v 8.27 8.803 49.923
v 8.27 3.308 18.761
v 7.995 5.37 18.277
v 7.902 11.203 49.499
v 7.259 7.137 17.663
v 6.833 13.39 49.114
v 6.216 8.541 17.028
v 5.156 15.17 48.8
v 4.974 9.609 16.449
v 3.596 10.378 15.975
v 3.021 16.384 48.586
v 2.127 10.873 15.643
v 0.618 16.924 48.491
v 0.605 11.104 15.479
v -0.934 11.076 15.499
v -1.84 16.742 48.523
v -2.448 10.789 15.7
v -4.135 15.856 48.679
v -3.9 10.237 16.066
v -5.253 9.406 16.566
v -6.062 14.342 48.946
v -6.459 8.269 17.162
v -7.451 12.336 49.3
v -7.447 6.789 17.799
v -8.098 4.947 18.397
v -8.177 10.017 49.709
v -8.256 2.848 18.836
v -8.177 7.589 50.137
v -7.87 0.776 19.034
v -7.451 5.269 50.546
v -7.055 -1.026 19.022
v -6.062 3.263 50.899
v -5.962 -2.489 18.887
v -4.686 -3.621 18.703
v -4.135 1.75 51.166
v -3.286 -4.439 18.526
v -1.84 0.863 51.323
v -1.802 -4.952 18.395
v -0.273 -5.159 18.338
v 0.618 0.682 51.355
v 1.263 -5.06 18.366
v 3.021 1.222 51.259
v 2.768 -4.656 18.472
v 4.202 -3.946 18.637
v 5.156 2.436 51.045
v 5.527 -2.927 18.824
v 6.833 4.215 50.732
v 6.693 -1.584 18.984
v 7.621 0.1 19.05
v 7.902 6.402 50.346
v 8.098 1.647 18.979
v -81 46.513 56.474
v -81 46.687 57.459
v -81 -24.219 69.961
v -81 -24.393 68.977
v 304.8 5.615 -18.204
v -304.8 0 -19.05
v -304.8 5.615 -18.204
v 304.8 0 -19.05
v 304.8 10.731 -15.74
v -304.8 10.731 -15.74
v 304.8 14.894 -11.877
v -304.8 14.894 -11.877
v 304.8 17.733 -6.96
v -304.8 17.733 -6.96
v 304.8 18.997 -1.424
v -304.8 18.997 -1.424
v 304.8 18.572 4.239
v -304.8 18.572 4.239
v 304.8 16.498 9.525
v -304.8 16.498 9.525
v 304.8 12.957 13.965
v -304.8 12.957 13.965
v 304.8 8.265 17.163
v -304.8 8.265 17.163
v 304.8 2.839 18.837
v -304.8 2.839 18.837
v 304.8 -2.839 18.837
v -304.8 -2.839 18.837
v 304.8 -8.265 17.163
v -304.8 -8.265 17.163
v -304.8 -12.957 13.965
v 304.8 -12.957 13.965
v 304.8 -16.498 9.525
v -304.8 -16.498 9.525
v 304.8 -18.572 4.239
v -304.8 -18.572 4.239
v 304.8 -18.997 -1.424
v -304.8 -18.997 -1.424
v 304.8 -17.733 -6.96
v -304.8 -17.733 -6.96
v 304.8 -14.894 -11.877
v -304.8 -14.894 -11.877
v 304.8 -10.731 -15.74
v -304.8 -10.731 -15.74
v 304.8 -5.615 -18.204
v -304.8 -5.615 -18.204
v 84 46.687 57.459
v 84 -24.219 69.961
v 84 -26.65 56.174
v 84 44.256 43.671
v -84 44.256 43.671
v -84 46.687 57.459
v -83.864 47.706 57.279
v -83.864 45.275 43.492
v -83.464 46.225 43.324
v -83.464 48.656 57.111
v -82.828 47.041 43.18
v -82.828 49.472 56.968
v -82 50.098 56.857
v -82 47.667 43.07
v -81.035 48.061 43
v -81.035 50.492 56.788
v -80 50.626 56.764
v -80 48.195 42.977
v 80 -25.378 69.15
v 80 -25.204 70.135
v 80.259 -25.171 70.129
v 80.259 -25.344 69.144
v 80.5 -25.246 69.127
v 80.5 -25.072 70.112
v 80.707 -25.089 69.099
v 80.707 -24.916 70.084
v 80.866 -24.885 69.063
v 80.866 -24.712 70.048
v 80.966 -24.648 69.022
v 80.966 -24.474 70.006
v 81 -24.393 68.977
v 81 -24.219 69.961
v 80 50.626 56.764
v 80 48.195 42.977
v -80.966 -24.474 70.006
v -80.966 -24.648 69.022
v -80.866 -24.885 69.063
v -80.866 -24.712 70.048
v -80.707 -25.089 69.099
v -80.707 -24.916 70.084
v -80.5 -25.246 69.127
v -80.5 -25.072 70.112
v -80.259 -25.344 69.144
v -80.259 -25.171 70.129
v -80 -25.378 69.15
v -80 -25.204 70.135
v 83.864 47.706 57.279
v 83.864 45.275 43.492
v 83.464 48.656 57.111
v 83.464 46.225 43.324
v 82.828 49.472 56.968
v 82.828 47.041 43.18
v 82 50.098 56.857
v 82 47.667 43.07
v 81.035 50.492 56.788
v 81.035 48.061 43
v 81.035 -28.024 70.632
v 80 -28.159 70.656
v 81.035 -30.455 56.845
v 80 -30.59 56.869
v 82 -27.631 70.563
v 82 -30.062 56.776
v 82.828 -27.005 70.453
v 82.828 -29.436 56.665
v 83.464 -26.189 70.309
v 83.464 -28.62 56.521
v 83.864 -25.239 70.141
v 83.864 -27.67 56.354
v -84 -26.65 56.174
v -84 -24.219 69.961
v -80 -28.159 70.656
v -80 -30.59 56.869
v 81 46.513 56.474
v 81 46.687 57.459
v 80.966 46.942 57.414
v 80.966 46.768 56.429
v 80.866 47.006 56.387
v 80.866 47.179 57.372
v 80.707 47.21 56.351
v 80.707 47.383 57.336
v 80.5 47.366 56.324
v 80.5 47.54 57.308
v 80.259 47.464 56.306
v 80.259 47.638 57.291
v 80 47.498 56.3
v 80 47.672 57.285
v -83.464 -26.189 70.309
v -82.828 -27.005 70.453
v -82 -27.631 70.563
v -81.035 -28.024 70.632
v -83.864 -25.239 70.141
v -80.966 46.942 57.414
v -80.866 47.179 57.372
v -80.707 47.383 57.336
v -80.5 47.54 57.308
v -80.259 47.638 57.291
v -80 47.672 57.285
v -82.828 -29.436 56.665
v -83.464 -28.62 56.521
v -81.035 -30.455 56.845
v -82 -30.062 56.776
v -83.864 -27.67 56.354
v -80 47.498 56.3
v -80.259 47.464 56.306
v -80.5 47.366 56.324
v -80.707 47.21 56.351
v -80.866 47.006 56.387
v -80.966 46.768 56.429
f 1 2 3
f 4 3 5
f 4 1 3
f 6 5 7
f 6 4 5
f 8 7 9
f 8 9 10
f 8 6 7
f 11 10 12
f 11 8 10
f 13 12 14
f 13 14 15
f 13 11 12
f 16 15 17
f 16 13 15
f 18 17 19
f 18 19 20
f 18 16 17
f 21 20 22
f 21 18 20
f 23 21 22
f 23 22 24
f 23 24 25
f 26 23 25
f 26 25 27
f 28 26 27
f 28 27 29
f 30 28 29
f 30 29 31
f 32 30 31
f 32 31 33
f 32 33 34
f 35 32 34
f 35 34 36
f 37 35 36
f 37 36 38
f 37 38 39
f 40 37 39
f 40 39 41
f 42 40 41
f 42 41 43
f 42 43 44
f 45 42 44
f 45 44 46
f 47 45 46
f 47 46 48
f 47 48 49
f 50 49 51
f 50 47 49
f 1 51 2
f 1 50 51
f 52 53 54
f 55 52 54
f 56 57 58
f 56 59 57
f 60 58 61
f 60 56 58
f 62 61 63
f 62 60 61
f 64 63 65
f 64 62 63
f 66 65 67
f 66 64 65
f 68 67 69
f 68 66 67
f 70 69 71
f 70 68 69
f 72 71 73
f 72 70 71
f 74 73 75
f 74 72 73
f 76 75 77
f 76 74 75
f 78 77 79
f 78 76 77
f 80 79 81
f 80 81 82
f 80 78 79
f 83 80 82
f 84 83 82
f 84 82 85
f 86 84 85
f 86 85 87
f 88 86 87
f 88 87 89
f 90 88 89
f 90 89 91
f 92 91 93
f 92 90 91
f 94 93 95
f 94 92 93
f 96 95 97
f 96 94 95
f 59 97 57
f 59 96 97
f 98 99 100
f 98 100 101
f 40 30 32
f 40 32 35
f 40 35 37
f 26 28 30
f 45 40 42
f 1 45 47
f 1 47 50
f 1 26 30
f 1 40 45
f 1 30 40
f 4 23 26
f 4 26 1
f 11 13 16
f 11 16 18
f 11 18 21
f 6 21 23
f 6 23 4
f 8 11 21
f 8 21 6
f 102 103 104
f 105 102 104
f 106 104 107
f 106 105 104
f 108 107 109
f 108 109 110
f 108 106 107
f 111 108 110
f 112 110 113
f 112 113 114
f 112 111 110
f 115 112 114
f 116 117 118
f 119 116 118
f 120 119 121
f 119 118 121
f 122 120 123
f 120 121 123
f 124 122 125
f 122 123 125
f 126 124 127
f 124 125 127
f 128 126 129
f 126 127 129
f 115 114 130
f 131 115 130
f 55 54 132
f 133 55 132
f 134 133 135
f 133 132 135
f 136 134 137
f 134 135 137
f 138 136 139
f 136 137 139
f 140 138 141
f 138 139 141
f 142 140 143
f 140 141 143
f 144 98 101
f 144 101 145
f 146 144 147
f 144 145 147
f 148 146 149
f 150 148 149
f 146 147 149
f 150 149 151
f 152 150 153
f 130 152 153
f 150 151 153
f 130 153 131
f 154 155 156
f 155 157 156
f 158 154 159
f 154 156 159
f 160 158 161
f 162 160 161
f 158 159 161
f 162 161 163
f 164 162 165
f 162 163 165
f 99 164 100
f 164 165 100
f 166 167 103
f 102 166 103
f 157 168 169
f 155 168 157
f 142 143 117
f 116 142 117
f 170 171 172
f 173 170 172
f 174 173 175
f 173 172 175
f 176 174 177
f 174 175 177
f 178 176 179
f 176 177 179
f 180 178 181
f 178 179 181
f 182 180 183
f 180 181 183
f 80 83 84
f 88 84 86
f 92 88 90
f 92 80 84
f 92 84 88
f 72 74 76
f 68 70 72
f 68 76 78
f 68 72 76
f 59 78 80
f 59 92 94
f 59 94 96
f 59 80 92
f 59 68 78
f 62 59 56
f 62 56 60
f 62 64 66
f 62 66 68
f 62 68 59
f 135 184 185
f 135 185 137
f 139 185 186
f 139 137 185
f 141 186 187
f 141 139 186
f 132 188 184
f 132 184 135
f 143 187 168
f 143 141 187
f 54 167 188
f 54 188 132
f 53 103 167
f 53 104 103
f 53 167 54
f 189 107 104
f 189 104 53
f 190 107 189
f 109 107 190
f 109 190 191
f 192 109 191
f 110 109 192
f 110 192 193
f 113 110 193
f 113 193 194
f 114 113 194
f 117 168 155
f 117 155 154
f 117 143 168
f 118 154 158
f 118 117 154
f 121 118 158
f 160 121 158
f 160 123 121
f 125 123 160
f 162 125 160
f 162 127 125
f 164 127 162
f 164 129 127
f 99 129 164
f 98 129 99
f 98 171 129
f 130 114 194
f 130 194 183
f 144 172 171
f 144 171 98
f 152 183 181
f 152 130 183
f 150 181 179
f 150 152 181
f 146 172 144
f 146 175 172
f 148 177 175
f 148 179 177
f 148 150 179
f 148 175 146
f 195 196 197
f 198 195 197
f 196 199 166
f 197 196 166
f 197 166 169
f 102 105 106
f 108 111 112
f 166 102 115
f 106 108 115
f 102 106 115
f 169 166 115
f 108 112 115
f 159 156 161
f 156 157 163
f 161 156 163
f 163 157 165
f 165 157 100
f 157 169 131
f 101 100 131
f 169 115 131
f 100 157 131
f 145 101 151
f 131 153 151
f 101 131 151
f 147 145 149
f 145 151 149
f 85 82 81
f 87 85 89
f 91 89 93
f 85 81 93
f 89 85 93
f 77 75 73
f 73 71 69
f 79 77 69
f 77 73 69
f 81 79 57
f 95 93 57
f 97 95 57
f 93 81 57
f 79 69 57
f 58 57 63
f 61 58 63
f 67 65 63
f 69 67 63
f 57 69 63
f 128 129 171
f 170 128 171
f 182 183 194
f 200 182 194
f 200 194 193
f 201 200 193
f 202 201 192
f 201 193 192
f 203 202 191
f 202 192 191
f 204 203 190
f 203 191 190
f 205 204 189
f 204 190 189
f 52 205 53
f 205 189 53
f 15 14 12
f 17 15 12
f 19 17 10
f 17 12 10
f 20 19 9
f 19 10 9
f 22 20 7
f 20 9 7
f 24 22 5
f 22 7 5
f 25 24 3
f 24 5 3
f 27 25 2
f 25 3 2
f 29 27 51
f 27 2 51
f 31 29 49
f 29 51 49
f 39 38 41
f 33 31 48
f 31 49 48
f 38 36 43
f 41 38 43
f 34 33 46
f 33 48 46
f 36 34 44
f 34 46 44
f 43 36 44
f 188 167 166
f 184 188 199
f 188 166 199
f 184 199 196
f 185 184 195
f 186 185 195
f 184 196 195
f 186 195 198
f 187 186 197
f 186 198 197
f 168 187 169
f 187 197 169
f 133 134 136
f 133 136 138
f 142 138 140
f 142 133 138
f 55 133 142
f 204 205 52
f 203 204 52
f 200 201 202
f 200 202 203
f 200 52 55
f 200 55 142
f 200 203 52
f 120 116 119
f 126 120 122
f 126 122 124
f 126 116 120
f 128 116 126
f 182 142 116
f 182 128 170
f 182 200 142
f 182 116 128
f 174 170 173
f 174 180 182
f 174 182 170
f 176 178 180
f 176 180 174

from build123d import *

# Parameters (mm, degrees)
SKETCH1_R           = 19.05
BOSS_EXTRUDE1_DEPTH = 304.8
SKETCH7_W           = 168
SKETCH7_H           = 80
BOSS_EXTRUDE3_DEPTH = 14
BOSS_EXTRUDE4_REACH = 76.765
SKETCH8_R           = 8.269516538
FILLET1_R           = 4
CUT_EXTRUDE2_DEPTH  = 1


with BuildPart() as part:
    # Sketch1 → Boss-Extrude1 (new body, symmetric)
    with BuildSketch(Plane(origin=(0, 0, 0), x_dir=(0, 0, -1), z_dir=(1, 0, 0))):
        Circle(SKETCH1_R)
    extrude(amount=BOSS_EXTRUDE1_DEPTH, both=True)


with BuildPart() as body_2:
    # Sketch7 → Boss-Extrude3 (new body)
    with BuildSketch(Plane(origin=(0, 11.233801501, 63.710054219), x_dir=(1, 0, 0), z_dir=(0, 0.173648178, 0.984807753))):
        Rectangle(SKETCH7_W, SKETCH7_H)
    extrude(amount=-BOSS_EXTRUDE3_DEPTH)

    # Fillet1
    fillet1_edges = [body_2.edges().sort_by_distance(p)[0] for p in [
        (84, -29.374045863, 63.762327055),
        (-84, -29.374045863, 63.762327055),
        (-84, 49.410574378, 49.870472841),
        (84, 49.410574378, 49.870472841),
    ]]
    fillet(fillet1_edges, radius=FILLET1_R)

    # Sketch9 → Cut-Extrude2 (cut)
    with BuildSketch(Plane(origin=(0, 11.233801501, 63.710054219), x_dir=(1, 0, 0), z_dir=(0, 0.173648178, 0.984807753))):
        with BuildLine():
            Line((-80, -37), (80, -37))
            ThreePointArc((80, -37), (80.707106781, -36.707106781), (81, -36))
            Line((81, -36), (81, 36))
            ThreePointArc((81, 36), (80.707106781, 36.707106781), (80, 37))
            Line((80, 37), (-80, 37))
            ThreePointArc((-80, 37), (-80.707106781, 36.707106781), (-81, 36))
            Line((-81, 36), (-81, -36))
            ThreePointArc((-81, -36), (-80.707106781, -36.707106781), (-80, -37))
        make_face()
    extrude(amount=-CUT_EXTRUDE2_DEPTH, mode=Mode.SUBTRACT)


with BuildPart() as body_3:

    # Sketch8 → Boss-Extrude4 (new body, up to next)
    with BuildSketch(Plane(origin=(0, 8.802727014, 49.922745677), x_dir=(1, 0, 0), z_dir=(0, 0.173648178, 0.984807753)), mode=Mode.PRIVATE) as boss_extrude4_sk1:
        Circle(SKETCH8_R)
    boss_extrude4_tool1 = extrude(boss_extrude4_sk1.sketch, amount=-BOSS_EXTRUDE4_REACH, mode=Mode.PRIVATE) - part.part
    add(boss_extrude4_tool1.solids().sort_by_distance((0, 8.802727, 49.922746))[0])


solid = Compound([part.part, body_2.part, body_3.part])
